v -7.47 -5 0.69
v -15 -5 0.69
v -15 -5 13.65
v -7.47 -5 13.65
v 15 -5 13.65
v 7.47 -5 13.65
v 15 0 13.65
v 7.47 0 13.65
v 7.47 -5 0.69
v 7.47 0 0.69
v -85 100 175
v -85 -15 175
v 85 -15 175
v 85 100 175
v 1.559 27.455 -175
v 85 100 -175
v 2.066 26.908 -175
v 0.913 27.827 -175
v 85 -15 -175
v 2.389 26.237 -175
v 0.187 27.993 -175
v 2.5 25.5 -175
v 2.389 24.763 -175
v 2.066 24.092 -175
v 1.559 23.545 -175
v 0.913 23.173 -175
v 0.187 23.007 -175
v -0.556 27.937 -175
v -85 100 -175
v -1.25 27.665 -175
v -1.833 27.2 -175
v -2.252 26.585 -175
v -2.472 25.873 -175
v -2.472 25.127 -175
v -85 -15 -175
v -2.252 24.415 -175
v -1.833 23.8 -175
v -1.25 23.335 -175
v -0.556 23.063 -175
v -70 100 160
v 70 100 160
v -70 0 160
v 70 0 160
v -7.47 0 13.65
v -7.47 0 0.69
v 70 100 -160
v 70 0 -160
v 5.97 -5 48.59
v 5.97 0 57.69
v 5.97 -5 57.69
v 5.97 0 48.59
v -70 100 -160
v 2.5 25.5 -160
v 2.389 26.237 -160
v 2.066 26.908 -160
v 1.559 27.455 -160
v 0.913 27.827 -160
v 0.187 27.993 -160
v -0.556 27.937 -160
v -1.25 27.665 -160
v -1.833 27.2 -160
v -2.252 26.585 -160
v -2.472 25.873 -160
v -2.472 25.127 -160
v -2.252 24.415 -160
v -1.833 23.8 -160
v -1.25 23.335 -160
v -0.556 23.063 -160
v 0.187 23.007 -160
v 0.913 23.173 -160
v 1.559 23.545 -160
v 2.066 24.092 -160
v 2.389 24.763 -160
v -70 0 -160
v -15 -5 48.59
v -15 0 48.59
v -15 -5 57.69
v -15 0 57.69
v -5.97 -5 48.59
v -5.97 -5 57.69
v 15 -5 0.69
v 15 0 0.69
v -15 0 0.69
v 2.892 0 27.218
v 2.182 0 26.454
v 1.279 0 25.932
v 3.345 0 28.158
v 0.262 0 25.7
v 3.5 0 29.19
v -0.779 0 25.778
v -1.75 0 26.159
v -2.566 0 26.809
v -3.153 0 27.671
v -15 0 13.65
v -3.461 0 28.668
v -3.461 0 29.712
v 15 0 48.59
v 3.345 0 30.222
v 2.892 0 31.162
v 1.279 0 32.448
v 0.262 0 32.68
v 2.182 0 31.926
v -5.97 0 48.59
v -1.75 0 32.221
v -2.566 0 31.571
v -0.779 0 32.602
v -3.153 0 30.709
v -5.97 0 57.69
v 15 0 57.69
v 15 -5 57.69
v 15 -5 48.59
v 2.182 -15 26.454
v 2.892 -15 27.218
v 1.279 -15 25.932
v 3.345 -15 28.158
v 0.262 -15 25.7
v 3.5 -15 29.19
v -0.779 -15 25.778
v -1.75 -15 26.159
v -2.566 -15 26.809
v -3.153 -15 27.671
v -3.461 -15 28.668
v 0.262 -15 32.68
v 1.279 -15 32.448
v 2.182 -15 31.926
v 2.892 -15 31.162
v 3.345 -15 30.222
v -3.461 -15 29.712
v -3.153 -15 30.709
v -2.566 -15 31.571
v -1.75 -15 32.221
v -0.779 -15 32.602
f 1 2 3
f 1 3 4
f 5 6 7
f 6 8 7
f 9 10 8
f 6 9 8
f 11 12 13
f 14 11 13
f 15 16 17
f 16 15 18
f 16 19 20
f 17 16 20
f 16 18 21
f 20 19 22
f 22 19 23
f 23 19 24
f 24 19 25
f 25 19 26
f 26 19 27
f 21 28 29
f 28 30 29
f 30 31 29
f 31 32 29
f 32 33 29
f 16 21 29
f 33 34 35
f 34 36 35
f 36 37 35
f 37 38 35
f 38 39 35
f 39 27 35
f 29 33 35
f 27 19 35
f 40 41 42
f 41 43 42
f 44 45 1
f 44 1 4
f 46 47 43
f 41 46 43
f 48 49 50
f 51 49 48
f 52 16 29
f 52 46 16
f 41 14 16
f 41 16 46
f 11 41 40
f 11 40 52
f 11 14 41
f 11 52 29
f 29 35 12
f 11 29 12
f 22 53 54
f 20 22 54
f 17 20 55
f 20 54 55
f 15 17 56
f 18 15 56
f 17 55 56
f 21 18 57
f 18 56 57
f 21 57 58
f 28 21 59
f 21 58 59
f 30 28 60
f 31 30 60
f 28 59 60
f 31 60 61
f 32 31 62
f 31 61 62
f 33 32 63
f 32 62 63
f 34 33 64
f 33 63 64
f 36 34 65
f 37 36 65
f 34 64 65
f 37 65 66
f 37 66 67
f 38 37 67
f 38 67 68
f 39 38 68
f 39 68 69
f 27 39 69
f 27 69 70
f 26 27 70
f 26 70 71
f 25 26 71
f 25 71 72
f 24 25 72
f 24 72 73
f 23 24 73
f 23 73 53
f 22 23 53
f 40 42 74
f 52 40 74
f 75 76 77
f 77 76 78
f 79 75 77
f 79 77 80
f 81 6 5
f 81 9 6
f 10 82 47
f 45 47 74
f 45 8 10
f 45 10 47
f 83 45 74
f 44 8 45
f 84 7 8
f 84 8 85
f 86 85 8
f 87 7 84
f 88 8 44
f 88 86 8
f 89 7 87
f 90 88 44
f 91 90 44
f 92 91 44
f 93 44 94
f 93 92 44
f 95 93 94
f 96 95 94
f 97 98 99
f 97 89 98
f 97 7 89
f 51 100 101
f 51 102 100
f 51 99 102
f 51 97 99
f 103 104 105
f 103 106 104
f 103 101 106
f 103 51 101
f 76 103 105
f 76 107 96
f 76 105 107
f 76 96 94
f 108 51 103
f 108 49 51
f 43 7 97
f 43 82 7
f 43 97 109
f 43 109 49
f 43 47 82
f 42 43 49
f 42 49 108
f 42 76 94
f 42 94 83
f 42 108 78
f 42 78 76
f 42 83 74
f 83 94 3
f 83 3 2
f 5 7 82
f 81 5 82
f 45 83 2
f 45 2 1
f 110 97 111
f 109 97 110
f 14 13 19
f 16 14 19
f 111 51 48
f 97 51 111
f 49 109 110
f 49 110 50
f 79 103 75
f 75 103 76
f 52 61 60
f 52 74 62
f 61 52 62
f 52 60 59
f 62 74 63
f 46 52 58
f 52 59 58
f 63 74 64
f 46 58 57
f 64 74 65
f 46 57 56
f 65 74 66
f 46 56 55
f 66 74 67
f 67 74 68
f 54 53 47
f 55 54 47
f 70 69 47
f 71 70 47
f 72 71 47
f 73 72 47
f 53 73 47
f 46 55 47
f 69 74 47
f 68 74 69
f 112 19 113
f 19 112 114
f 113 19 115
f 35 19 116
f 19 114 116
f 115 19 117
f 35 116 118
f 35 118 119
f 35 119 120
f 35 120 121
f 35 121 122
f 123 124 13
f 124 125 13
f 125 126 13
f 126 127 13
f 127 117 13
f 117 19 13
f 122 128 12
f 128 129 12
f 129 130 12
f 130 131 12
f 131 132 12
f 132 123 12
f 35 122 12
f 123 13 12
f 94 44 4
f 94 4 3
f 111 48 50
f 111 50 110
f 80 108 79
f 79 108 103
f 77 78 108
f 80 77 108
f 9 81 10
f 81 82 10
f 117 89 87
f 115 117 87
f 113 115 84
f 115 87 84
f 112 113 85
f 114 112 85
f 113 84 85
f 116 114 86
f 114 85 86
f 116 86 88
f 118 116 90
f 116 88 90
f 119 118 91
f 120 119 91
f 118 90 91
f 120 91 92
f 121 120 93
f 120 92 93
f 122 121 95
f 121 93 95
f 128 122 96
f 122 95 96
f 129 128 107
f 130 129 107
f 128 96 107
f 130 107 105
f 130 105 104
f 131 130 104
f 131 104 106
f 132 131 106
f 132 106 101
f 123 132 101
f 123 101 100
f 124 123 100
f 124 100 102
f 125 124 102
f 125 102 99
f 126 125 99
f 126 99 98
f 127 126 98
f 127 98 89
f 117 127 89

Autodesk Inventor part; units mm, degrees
ref_plane "YZ Plane" through (0, 0, 0) normal (1, 0, 0) x (0, 1, 0)
ref_plane "XZ Plane" through (0, 0, 0) normal (0, 1, 0) x (-1, 0, 0)
ref_plane "XY Plane" through (0, 0, 0) normal (0, 0, 1) x (1, 0, 0)
sketch "Boceto1" plane through (0, 0, 0) normal (0, 1, 0) x (-1, 0, 0)
  line L0 (-85, -175) -> (85, -175)
  line L1 (85, -175) -> (85, 175)
  line L2 (85, 175) -> (-85, 175)
  line L3 (-85, 175) -> (-85, -175)
  line L4 (70, 160) -> (70, -160)
  line L5 (85, -160) -> (-85, -160)
  line L6 (-70, -160) -> (-70, 160)
  line L7 (-85, 160) -> (85, 160)
  line L8 (0, -160) -> (0, -60) construction
  line L9 (0, 175) -> (0, 29.19) construction
  circle A0 centre (0, 29.19) radius 5 construction
  line L10 (0, 29.19) -> (0, 0.69) construction
  line L11 (0, 29.19) -> (0, 57.69) construction
  line L12 (17.8997, 57.69) -> (-17.8997, 57.69) construction
  line L13 (-17.8997, 57.69) -> (-17.8997, 0.69) construction
  line L14 (-17.8997, 0.69) -> (17.8997, 0.69) construction
  line L15 (17.8997, 0.69) -> (17.8997, 57.69) construction
  point P0 (0, 0)
  dimension "d0" = 170
  dimension "d1" = 350
  dimension "d2" = 15
  dimension "d7" = 100
  dimension "d8" = 145.81
  dimension "d9" = 10
  dimension "d12" = 28.5
  dimension "d13" = 28.5
extrude "Extrusión1" add sketch "Boceto1" along normal blind 100 contours L3 L5 L1 L0
extrude "Extrusión2" add sketch "Boceto1" along normal blind 100 contours L5 L4 L7 L1
extrude "Extrusión3" add sketch "Boceto1" against normal blind 15
sketch "Boceto2" plane through (-70, 100, -160) normal (0, 0, 1) x (1, 0, 0)
  line L0 (155, -100) -> (155, 0) construction
  line L1 (0, 0) -> (77.5, 0)
  line L2 (0, 0) -> (155, 0) projected
  line L3 (77.5, -100) -> (70, -100) construction
  line L4 (0, -100) -> (155, -100) construction
  line L5 (70, -100) -> (70, -74.5) construction
  circle A0 centre (70, -74.5) radius 2.5
  circle A1 centre (70, -74.5) radius 7.5
  dimension "d94" = 7.5
  dimension "d95" = 25.5
  dimension "d96" = 5
  dimension "d97" = 5
extrude "Extrusión4" cut sketch "Boceto2" against normal through all contours A0
extrude "Extrusión5" add sketch "Boceto1" along normal blind 100 contours L3 L2 L1 L7
extrude "Extrusión6" add sketch "Boceto1" along normal blind 100 contours L3 L7 L6 L5
sketch "Boceto3" plane through (0, 0, 0) normal (0, 1, 0) x (1, 0, 0)
  line L0 (-70, -160) -> (-70, 160) construction
  line L1 (-70, -160) -> (7.5, -160) construction
  line L2 (-70, -160) -> (85, -160) construction
  line L3 (-70, -160) -> (7.5, -160) construction
  line L4 (7.5, -29.19) -> (-9, -29.19) construction
  line L5 (15, -57.69) -> (5.97, -57.69)
  line L6 (5.97, -57.69) -> (5.97, -48.59)
  line L7 (5.97, -48.59) -> (15, -48.59)
  line L8 (15, -48.59) -> (15, -57.69)
  line L9 (15, -0.69) -> (7.47, -0.69)
  line L10 (7.47, -0.69) -> (7.47, -13.65)
  line L11 (7.47, -13.65) -> (15, -13.65)
  line L12 (15, -13.65) -> (15, -0.69)
  line L13 (85, 175) -> (85, -175) projected
  line L14 (85, -29.19) -> (0, -29.19) construction
  circle A0 centre (0, -29.19) radius 3.5
  line L15 (0, -29.19) -> (0, -22.225) construction
  line L16 (-15, -57.69) -> (-5.97, -57.69)
  line L17 (-5.97, -48.59) -> (-15, -48.59)
  line L18 (-15, -48.59) -> (-15, -57.69)
  line L19 (-15, -0.69) -> (-7.47, -0.69)
  line L20 (-7.47, -0.69) -> (-7.47, -13.65)
  line L21 (-7.47, -13.65) -> (-15, -13.65)
  line L22 (-15, -13.65) -> (-15, -0.69)
  line L23 (-5.97, -57.69) -> (-5.97, -48.59)
  line L24 (-85, -175) -> (85, -175) projected
  point P0 (-85, -160)
  point P1 (15, -7.17)
  point P2 (-15, -7.17)
  dimension "d46" = 9.03
  dimension "d47" = 9.1
  dimension "d48" = 12.96
  dimension "d54" = 85
  dimension "d55" = 7
  dimension "d62" = 30
  dimension "d63" = 30
  dimension "d68" = 70
  dimension "d69" = 117.31
  dimension "d70" = 90.97
  dimension "d71" = 161.35
  dimension "d72" = 70
  dimension "d73" = 7.53
  dimension "d74" = 92.47
extrude "Extrusión12" cut sketch "Boceto3" against normal blind 5 contours L5 L6 L7 L8 | L12 L11 L10 L9 | L18 L17 L23 L16 | L19 L20 L21 L22
extrude "Extrusión13" cut sketch "Boceto3" against normal through all contours A0
sketch "Boceto8" plane through (85, 100, -160) normal (1, 0, 0) x (0, 0, -1)
  line L0 (-320, -100) -> (0, -100) projected
  line L1 (0, -100) -> (-100, -100)
  line L2 (-100, -100) -> (-100, -14.2875)
  line L3 (-335, -100) -> (0, -100) projected
  line L4 (-192.69, -100) -> (-185.69, -100) projected
  line L5 (-189.19, -100) -> (-100, -100)
  line L6 (-335, -115) -> (15, -115) projected
  point P0 (-160, -100)
  dimension "d66" = 100
  dimension "d67" = 89.19
sketch "Boceto9" plane through (0, 0, 0) normal (0, 1, 0) x (1, 0, 0)
  line L0 (0, 160) -> (0, 60)
  line L1 (0, 60) -> (40, 60) construction
  line L2 (0, 60) -> (-40, 60) construction
  line L3 (0, 60) -> (-40, 60) construction
  line L4 (40, 60) -> (40, 52.5) construction
  line L5 (40, 60) -> (40, 67.5) construction
  line L6 (40, 67.5) -> (20, 67.5)
  line L7 (20, 67.5) -> (20, 52.5)
  line L8 (20, 52.5) -> (40, 52.5)
  line L9 (40, 52.5) -> (40, 67.5)
  line L10 (-40, 60) -> (-40, 67.5) construction
  line L11 (-40, 67.5) -> (-20, 67.5)
  line L12 (-20, 67.5) -> (-20, 52.5)
  line L13 (-20, 52.5) -> (-40, 52.5)
  line L14 (-40, 67.5) -> (-40, 52.5)
  line L15 (-20, 80) -> (-40, 80)
  line L16 (-40, 80) -> (-40, 40)
  line L17 (-40, 40) -> (-20, 40)
  line L18 (-20, 40) -> (-20, 80)
  line L19 (20, 80) -> (40, 80)
  line L20 (40, 80) -> (40, 40)
  line L21 (40, 40) -> (20, 40)
  line L22 (20, 40) -> (20, 80)
  point P0 (0, 0)
  point P1 (-30, 60)
  dimension "d80" = 100
  dimension "d83" = 40
  dimension "d86" = 7.5
  dimension "d87" = 7.5
  dimension "d88" = 20
  dimension "d89" = 15
  dimension "d98" = 20
  dimension "d99" = 40
extrude "Extrusión14" [suppressed]
sketch "Boceto10" plane through (0, 0, 0) normal (0, 1, 0) x (1, 0, 0)
  circle A0 centre (0, -29.19) radius 3.5 projected
  line L0 (0, -29.19) -> (0, 170.81)
  line L1 (0, -29.19) -> (200, -29.19) construction
  point P0 (0, 0)
  dimension "d92" = 200
  dimension "d93" = 90
extrude "Extrusión15" [suppressed]
properties part number "DarkBox" material "Madera (cerezo)"
